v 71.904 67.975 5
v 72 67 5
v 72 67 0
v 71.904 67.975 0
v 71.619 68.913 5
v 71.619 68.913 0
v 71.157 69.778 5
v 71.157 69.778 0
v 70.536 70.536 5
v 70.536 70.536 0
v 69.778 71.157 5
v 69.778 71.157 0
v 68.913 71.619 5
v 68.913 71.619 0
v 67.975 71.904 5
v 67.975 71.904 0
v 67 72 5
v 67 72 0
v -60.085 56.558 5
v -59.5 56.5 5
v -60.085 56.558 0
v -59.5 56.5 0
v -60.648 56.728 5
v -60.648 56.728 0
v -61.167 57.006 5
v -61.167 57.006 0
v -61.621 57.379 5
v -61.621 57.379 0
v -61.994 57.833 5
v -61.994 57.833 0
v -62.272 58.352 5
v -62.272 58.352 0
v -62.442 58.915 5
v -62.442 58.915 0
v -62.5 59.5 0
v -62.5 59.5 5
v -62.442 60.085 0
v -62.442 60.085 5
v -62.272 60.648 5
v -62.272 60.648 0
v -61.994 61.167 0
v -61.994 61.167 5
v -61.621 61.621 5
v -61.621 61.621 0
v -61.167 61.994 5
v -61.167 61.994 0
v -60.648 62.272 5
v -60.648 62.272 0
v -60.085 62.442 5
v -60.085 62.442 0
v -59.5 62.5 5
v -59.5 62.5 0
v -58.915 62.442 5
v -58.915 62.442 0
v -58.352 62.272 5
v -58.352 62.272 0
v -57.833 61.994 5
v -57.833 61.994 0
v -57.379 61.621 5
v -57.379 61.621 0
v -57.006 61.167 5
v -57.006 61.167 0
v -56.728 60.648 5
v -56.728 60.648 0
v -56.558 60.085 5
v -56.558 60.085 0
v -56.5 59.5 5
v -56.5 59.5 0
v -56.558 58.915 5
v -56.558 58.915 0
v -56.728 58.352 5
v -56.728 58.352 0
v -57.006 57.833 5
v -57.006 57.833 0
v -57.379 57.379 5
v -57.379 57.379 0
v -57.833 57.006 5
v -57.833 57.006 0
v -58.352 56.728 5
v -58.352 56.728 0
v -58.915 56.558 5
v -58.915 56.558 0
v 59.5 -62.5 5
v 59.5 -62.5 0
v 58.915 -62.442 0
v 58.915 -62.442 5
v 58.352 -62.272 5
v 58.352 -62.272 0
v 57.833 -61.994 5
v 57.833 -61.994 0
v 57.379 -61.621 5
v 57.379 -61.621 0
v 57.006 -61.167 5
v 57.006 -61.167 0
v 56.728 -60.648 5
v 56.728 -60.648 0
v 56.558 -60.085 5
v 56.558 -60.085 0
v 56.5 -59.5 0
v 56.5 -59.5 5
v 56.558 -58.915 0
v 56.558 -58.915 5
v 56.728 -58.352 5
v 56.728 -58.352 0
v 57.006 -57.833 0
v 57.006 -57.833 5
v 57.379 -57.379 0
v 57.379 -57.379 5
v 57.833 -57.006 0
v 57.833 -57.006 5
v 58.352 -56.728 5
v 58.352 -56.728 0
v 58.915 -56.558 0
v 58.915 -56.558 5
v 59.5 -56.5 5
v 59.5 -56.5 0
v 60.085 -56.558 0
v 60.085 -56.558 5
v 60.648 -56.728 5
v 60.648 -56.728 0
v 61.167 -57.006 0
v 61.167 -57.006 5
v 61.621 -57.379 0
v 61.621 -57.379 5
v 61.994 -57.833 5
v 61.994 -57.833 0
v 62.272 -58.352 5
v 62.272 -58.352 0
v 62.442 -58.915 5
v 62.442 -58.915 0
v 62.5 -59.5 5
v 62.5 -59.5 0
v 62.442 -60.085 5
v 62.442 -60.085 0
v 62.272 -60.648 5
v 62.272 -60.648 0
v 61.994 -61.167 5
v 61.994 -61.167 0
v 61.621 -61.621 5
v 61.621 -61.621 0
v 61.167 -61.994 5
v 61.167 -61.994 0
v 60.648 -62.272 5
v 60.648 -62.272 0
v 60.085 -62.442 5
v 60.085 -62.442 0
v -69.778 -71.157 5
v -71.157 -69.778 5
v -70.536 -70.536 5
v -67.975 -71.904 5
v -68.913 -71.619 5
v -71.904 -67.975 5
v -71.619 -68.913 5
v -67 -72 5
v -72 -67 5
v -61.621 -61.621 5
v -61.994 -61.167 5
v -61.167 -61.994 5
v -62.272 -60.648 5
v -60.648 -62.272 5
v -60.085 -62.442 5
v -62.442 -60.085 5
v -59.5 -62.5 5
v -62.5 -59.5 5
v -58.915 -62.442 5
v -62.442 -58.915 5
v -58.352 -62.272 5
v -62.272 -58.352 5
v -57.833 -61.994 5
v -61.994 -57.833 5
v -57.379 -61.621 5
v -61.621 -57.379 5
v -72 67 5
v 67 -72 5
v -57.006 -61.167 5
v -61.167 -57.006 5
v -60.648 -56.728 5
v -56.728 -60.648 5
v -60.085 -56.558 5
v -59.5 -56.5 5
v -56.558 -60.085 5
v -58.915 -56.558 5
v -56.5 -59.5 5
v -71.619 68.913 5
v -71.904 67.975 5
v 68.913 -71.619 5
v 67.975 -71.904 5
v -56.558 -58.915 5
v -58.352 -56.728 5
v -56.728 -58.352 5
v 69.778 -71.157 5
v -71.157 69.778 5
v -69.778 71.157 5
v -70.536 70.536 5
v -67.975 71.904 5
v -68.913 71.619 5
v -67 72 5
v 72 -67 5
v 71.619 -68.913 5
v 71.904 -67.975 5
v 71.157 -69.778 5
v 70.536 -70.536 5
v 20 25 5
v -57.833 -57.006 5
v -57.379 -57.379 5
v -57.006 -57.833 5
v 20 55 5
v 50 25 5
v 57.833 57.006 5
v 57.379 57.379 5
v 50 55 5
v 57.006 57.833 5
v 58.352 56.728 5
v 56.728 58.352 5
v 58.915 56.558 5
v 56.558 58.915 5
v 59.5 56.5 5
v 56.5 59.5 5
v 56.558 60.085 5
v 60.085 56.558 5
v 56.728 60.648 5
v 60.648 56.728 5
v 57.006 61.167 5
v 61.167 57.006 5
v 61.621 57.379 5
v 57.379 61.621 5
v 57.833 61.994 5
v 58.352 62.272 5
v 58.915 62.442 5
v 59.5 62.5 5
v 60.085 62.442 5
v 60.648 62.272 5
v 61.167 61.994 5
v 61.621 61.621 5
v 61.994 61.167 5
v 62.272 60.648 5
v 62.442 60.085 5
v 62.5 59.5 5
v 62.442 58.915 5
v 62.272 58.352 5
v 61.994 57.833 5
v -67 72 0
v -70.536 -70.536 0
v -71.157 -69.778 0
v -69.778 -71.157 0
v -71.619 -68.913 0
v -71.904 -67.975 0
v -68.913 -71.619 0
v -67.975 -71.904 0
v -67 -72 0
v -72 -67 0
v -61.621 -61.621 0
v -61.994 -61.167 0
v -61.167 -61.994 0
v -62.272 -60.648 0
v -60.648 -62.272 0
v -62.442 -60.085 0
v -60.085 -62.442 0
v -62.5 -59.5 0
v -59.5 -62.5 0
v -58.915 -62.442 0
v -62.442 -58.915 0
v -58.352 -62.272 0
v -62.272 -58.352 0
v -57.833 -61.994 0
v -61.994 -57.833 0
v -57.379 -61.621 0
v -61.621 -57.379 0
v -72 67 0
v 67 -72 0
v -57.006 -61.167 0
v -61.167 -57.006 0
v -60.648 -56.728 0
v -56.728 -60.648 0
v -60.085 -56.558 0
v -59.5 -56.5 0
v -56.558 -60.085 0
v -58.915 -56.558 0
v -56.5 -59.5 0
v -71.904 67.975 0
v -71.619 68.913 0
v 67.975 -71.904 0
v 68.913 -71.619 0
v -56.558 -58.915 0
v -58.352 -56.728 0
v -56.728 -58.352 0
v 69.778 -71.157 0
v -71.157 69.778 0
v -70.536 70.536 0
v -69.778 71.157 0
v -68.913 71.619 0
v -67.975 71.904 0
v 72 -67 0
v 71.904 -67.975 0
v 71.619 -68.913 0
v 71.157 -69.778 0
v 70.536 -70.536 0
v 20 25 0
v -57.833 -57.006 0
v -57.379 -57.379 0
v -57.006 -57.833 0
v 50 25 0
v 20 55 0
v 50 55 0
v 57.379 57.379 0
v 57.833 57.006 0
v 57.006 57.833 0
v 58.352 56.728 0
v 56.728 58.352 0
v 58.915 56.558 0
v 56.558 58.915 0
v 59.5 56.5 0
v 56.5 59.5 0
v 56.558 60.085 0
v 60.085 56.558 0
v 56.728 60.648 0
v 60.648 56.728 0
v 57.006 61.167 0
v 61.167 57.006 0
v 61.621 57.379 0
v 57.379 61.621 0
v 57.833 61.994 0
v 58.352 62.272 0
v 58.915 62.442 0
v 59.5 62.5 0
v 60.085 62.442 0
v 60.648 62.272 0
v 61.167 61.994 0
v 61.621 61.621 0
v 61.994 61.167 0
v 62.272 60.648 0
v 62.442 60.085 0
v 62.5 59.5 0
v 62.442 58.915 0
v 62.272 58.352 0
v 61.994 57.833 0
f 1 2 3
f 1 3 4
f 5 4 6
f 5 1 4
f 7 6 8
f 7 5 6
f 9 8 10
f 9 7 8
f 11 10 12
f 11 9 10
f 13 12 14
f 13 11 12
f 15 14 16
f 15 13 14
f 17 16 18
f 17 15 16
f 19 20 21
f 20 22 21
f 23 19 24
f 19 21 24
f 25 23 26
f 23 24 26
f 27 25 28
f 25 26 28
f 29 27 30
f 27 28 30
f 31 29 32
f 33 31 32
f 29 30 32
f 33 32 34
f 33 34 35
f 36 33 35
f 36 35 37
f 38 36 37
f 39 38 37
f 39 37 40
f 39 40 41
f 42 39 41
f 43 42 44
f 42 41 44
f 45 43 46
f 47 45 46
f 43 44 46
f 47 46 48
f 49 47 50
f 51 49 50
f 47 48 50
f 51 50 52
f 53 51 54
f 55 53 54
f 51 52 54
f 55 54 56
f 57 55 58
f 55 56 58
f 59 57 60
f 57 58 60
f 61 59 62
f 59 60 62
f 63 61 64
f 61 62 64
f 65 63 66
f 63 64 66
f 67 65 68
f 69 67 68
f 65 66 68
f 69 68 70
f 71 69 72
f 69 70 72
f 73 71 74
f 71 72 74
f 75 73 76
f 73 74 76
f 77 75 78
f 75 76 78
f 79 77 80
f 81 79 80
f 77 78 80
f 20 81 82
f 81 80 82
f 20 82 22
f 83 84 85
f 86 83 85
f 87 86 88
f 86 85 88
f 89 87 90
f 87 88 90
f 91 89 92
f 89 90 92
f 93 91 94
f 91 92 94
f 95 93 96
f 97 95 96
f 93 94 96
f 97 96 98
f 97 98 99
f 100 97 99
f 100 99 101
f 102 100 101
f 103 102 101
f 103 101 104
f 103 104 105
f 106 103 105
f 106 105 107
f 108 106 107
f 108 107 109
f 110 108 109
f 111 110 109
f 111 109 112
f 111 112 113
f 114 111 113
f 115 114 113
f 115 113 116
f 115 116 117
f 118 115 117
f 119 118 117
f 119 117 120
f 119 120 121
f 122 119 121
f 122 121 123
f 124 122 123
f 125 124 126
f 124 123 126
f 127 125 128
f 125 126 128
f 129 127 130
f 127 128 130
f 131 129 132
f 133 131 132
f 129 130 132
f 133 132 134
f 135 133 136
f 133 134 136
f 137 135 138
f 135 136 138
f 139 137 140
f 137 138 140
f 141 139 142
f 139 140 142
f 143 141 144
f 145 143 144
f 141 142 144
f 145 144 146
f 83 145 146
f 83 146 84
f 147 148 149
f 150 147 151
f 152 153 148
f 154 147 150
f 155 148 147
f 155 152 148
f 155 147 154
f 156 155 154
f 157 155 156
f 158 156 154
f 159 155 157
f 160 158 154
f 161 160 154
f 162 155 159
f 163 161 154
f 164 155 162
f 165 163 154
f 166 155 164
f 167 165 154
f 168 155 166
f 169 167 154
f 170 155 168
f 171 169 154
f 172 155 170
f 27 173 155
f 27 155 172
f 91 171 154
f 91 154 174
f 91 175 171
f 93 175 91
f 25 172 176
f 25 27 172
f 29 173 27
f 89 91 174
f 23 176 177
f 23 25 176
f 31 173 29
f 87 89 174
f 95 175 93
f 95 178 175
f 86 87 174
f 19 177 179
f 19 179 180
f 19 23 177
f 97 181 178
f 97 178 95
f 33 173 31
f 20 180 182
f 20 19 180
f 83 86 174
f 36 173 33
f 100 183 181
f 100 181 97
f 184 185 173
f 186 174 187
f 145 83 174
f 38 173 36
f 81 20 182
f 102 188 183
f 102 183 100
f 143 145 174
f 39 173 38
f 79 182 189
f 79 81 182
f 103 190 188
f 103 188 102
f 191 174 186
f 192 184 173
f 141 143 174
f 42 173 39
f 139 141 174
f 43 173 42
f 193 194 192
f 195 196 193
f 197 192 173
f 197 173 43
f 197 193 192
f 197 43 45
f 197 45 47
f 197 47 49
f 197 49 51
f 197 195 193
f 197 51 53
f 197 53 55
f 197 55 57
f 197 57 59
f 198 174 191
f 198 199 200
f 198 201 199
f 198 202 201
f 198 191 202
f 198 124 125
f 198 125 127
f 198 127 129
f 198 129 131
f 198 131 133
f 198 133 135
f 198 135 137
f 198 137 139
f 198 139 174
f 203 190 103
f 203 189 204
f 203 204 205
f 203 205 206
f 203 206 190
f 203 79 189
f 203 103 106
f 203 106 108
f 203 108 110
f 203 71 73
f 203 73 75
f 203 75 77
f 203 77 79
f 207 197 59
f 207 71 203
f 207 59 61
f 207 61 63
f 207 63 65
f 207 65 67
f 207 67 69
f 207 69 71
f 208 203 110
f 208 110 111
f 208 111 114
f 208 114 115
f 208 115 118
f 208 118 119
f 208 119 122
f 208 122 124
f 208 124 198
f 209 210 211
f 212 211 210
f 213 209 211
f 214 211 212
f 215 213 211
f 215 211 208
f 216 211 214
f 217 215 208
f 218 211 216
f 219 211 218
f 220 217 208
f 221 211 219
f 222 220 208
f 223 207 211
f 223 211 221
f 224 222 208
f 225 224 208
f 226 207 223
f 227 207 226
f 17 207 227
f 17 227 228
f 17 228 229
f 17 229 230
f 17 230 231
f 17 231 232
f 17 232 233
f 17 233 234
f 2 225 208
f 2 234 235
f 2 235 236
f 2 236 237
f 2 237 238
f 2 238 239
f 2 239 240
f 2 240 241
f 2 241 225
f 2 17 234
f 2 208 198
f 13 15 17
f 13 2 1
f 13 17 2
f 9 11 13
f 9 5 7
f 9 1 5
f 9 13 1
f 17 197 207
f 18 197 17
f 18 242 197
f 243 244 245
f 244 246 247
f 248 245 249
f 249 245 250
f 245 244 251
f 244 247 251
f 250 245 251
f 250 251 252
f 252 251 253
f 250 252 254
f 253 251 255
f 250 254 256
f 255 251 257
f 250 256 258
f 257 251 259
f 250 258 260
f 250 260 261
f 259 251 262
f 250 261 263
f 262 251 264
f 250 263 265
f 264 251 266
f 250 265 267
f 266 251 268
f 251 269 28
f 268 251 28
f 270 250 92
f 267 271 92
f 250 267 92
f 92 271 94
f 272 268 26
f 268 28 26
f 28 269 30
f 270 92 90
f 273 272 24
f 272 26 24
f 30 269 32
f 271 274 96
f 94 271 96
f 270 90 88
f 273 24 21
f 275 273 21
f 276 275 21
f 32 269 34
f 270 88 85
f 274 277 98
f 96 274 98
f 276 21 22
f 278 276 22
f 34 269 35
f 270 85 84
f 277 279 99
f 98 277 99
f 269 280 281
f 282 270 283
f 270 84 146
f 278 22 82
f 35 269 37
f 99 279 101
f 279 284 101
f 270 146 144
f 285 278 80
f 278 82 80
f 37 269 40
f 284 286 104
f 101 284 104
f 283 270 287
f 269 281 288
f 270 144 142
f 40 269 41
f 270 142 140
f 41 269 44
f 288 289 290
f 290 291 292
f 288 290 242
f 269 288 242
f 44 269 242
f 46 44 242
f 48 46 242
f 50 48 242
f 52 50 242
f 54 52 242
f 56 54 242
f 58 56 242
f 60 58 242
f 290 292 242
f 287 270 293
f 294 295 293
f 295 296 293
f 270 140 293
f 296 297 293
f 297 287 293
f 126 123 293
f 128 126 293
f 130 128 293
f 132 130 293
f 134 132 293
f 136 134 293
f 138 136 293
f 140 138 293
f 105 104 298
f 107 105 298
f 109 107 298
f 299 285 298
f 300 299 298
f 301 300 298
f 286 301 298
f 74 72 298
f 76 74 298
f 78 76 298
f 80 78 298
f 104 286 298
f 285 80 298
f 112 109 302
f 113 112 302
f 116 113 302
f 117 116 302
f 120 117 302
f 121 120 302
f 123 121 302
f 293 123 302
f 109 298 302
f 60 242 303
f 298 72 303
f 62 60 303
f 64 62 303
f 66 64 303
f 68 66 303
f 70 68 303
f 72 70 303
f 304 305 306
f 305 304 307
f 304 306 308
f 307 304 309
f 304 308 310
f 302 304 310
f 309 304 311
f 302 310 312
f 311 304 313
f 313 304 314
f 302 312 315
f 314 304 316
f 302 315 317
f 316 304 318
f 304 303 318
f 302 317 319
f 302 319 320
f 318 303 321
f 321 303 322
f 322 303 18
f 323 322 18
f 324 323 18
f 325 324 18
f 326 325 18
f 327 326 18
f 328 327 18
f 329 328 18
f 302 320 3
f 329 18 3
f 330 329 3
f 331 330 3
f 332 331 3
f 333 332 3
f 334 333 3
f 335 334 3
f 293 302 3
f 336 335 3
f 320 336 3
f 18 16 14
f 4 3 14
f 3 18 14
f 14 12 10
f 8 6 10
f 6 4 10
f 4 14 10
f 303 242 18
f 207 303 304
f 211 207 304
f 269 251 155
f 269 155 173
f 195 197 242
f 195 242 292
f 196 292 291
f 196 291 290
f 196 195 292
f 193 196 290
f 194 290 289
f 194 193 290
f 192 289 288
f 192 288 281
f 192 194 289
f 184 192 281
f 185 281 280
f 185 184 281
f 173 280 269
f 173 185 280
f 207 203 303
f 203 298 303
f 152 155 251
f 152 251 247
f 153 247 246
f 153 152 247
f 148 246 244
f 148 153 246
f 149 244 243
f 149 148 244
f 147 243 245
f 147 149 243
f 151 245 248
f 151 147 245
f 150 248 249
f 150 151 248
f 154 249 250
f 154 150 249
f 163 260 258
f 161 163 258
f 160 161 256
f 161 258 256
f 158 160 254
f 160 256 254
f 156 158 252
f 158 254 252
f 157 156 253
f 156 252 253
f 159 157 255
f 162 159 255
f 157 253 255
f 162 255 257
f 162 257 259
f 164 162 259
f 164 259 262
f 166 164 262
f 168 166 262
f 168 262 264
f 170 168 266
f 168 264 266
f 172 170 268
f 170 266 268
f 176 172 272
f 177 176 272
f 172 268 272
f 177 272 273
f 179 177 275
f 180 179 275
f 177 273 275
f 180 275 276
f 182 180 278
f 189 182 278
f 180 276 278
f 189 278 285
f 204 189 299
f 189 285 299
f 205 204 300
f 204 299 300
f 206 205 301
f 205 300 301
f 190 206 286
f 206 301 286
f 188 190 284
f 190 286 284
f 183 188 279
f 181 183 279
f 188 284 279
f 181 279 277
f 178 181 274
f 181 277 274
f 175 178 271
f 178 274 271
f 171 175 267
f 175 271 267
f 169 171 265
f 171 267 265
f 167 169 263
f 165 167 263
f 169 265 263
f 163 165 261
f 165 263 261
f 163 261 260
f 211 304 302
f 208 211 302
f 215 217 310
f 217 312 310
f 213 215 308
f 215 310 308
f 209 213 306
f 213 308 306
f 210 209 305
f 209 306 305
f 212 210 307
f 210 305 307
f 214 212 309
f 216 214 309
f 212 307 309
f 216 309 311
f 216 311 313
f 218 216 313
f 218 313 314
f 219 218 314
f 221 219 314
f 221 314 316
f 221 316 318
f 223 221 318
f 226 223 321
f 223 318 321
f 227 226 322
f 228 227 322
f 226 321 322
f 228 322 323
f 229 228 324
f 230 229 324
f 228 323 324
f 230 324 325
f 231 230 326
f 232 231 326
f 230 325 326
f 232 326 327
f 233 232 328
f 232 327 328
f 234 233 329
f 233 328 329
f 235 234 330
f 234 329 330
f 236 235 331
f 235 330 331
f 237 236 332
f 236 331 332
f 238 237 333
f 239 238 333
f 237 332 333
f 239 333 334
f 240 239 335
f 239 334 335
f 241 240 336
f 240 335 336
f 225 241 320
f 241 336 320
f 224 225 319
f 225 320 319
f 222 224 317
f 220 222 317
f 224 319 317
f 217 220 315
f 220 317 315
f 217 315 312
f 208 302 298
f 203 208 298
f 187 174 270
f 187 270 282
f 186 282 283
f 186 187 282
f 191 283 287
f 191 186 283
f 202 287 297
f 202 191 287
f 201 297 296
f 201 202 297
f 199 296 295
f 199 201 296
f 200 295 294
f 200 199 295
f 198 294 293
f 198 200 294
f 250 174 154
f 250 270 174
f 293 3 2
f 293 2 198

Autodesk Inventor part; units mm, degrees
ref_plane "YZ Plane" through (0, 0, 0) normal (1, 0, 0) x (0, 1, 0)
ref_plane "XZ Plane" through (0, 0, 0) normal (0, 1, 0) x (-1, 0, 0)
ref_plane "XY Plane" through (0, 0, 0) normal (0, 0, 1) x (1, 0, 0)
sketch "Sketch1" plane through (0, 0, 0) normal (0, 0, 1) x (1, 0, 0)
  line L0 (-72, 72) -> (72, 72)
  line L1 (72, 72) -> (72, -72)
  line L2 (72, -72) -> (-72, -72)
  line L3 (-72, -72) -> (-72, 72)
  line L4 (20, 55) -> (50, 55)
  line L5 (50, 55) -> (50, 25)
  line L6 (50, 25) -> (20, 25)
  line L7 (20, 25) -> (20, 55)
  point P0 (0, 0)
  dimension "d0" = 144
  dimension "d1" = 144
  dimension "d2" = 72
  dimension "d3" = 72
  dimension "d4" = 20
  dimension "d5" = 25
  dimension "d6" = 30
  dimension "d7" = 30
extrude "Extrusion1" add sketch "Sketch1" along normal blind 5
fillet "Fillet1" radius 5 4 edges at (-72, -72, 2.5) (72, -72, 2.5) (72, 72, 2.5) (-72, 72, 2.5)
sketch "Sketch3" plane through (0, 0, 5) normal (0, 0, 1) x (1, 0, 0)
  line L0 (-59.5, 59.5) -> (59.5, 59.5)
  line L1 (59.5, 59.5) -> (59.5, -59.5)
  line L2 (59.5, -59.5) -> (-59.5, -59.5)
  line L3 (-59.5, -59.5) -> (-59.5, 59.5)
  circle A0 centre (-59.5, 59.5) radius 3
  point P0 (0, 0)
  dimension "d23" = 119
  dimension "d24" = 119
  dimension "d25" = 59.5
  dimension "d26" = 59.5
  dimension "d27" = 6
hole "Hole2" at (-59.5, 59.5, 5) at (59.5, 59.5, 5) at (59.5, -59.5, 5) at (-59.5, -59.5, 5) direction (0, 0, -1) diameter 6 end through all
equation "\"d2\" = 0.5 * d0"
equation "\"d3\" = 0.5 * d1"
equation "\"d25\" = 0.5 * d24"
equation "\"d26\" = 0.5 * d23"
equation "\"d28\" = d27"
properties part number "WaagePlexiTurm" material "PET Plastic"
